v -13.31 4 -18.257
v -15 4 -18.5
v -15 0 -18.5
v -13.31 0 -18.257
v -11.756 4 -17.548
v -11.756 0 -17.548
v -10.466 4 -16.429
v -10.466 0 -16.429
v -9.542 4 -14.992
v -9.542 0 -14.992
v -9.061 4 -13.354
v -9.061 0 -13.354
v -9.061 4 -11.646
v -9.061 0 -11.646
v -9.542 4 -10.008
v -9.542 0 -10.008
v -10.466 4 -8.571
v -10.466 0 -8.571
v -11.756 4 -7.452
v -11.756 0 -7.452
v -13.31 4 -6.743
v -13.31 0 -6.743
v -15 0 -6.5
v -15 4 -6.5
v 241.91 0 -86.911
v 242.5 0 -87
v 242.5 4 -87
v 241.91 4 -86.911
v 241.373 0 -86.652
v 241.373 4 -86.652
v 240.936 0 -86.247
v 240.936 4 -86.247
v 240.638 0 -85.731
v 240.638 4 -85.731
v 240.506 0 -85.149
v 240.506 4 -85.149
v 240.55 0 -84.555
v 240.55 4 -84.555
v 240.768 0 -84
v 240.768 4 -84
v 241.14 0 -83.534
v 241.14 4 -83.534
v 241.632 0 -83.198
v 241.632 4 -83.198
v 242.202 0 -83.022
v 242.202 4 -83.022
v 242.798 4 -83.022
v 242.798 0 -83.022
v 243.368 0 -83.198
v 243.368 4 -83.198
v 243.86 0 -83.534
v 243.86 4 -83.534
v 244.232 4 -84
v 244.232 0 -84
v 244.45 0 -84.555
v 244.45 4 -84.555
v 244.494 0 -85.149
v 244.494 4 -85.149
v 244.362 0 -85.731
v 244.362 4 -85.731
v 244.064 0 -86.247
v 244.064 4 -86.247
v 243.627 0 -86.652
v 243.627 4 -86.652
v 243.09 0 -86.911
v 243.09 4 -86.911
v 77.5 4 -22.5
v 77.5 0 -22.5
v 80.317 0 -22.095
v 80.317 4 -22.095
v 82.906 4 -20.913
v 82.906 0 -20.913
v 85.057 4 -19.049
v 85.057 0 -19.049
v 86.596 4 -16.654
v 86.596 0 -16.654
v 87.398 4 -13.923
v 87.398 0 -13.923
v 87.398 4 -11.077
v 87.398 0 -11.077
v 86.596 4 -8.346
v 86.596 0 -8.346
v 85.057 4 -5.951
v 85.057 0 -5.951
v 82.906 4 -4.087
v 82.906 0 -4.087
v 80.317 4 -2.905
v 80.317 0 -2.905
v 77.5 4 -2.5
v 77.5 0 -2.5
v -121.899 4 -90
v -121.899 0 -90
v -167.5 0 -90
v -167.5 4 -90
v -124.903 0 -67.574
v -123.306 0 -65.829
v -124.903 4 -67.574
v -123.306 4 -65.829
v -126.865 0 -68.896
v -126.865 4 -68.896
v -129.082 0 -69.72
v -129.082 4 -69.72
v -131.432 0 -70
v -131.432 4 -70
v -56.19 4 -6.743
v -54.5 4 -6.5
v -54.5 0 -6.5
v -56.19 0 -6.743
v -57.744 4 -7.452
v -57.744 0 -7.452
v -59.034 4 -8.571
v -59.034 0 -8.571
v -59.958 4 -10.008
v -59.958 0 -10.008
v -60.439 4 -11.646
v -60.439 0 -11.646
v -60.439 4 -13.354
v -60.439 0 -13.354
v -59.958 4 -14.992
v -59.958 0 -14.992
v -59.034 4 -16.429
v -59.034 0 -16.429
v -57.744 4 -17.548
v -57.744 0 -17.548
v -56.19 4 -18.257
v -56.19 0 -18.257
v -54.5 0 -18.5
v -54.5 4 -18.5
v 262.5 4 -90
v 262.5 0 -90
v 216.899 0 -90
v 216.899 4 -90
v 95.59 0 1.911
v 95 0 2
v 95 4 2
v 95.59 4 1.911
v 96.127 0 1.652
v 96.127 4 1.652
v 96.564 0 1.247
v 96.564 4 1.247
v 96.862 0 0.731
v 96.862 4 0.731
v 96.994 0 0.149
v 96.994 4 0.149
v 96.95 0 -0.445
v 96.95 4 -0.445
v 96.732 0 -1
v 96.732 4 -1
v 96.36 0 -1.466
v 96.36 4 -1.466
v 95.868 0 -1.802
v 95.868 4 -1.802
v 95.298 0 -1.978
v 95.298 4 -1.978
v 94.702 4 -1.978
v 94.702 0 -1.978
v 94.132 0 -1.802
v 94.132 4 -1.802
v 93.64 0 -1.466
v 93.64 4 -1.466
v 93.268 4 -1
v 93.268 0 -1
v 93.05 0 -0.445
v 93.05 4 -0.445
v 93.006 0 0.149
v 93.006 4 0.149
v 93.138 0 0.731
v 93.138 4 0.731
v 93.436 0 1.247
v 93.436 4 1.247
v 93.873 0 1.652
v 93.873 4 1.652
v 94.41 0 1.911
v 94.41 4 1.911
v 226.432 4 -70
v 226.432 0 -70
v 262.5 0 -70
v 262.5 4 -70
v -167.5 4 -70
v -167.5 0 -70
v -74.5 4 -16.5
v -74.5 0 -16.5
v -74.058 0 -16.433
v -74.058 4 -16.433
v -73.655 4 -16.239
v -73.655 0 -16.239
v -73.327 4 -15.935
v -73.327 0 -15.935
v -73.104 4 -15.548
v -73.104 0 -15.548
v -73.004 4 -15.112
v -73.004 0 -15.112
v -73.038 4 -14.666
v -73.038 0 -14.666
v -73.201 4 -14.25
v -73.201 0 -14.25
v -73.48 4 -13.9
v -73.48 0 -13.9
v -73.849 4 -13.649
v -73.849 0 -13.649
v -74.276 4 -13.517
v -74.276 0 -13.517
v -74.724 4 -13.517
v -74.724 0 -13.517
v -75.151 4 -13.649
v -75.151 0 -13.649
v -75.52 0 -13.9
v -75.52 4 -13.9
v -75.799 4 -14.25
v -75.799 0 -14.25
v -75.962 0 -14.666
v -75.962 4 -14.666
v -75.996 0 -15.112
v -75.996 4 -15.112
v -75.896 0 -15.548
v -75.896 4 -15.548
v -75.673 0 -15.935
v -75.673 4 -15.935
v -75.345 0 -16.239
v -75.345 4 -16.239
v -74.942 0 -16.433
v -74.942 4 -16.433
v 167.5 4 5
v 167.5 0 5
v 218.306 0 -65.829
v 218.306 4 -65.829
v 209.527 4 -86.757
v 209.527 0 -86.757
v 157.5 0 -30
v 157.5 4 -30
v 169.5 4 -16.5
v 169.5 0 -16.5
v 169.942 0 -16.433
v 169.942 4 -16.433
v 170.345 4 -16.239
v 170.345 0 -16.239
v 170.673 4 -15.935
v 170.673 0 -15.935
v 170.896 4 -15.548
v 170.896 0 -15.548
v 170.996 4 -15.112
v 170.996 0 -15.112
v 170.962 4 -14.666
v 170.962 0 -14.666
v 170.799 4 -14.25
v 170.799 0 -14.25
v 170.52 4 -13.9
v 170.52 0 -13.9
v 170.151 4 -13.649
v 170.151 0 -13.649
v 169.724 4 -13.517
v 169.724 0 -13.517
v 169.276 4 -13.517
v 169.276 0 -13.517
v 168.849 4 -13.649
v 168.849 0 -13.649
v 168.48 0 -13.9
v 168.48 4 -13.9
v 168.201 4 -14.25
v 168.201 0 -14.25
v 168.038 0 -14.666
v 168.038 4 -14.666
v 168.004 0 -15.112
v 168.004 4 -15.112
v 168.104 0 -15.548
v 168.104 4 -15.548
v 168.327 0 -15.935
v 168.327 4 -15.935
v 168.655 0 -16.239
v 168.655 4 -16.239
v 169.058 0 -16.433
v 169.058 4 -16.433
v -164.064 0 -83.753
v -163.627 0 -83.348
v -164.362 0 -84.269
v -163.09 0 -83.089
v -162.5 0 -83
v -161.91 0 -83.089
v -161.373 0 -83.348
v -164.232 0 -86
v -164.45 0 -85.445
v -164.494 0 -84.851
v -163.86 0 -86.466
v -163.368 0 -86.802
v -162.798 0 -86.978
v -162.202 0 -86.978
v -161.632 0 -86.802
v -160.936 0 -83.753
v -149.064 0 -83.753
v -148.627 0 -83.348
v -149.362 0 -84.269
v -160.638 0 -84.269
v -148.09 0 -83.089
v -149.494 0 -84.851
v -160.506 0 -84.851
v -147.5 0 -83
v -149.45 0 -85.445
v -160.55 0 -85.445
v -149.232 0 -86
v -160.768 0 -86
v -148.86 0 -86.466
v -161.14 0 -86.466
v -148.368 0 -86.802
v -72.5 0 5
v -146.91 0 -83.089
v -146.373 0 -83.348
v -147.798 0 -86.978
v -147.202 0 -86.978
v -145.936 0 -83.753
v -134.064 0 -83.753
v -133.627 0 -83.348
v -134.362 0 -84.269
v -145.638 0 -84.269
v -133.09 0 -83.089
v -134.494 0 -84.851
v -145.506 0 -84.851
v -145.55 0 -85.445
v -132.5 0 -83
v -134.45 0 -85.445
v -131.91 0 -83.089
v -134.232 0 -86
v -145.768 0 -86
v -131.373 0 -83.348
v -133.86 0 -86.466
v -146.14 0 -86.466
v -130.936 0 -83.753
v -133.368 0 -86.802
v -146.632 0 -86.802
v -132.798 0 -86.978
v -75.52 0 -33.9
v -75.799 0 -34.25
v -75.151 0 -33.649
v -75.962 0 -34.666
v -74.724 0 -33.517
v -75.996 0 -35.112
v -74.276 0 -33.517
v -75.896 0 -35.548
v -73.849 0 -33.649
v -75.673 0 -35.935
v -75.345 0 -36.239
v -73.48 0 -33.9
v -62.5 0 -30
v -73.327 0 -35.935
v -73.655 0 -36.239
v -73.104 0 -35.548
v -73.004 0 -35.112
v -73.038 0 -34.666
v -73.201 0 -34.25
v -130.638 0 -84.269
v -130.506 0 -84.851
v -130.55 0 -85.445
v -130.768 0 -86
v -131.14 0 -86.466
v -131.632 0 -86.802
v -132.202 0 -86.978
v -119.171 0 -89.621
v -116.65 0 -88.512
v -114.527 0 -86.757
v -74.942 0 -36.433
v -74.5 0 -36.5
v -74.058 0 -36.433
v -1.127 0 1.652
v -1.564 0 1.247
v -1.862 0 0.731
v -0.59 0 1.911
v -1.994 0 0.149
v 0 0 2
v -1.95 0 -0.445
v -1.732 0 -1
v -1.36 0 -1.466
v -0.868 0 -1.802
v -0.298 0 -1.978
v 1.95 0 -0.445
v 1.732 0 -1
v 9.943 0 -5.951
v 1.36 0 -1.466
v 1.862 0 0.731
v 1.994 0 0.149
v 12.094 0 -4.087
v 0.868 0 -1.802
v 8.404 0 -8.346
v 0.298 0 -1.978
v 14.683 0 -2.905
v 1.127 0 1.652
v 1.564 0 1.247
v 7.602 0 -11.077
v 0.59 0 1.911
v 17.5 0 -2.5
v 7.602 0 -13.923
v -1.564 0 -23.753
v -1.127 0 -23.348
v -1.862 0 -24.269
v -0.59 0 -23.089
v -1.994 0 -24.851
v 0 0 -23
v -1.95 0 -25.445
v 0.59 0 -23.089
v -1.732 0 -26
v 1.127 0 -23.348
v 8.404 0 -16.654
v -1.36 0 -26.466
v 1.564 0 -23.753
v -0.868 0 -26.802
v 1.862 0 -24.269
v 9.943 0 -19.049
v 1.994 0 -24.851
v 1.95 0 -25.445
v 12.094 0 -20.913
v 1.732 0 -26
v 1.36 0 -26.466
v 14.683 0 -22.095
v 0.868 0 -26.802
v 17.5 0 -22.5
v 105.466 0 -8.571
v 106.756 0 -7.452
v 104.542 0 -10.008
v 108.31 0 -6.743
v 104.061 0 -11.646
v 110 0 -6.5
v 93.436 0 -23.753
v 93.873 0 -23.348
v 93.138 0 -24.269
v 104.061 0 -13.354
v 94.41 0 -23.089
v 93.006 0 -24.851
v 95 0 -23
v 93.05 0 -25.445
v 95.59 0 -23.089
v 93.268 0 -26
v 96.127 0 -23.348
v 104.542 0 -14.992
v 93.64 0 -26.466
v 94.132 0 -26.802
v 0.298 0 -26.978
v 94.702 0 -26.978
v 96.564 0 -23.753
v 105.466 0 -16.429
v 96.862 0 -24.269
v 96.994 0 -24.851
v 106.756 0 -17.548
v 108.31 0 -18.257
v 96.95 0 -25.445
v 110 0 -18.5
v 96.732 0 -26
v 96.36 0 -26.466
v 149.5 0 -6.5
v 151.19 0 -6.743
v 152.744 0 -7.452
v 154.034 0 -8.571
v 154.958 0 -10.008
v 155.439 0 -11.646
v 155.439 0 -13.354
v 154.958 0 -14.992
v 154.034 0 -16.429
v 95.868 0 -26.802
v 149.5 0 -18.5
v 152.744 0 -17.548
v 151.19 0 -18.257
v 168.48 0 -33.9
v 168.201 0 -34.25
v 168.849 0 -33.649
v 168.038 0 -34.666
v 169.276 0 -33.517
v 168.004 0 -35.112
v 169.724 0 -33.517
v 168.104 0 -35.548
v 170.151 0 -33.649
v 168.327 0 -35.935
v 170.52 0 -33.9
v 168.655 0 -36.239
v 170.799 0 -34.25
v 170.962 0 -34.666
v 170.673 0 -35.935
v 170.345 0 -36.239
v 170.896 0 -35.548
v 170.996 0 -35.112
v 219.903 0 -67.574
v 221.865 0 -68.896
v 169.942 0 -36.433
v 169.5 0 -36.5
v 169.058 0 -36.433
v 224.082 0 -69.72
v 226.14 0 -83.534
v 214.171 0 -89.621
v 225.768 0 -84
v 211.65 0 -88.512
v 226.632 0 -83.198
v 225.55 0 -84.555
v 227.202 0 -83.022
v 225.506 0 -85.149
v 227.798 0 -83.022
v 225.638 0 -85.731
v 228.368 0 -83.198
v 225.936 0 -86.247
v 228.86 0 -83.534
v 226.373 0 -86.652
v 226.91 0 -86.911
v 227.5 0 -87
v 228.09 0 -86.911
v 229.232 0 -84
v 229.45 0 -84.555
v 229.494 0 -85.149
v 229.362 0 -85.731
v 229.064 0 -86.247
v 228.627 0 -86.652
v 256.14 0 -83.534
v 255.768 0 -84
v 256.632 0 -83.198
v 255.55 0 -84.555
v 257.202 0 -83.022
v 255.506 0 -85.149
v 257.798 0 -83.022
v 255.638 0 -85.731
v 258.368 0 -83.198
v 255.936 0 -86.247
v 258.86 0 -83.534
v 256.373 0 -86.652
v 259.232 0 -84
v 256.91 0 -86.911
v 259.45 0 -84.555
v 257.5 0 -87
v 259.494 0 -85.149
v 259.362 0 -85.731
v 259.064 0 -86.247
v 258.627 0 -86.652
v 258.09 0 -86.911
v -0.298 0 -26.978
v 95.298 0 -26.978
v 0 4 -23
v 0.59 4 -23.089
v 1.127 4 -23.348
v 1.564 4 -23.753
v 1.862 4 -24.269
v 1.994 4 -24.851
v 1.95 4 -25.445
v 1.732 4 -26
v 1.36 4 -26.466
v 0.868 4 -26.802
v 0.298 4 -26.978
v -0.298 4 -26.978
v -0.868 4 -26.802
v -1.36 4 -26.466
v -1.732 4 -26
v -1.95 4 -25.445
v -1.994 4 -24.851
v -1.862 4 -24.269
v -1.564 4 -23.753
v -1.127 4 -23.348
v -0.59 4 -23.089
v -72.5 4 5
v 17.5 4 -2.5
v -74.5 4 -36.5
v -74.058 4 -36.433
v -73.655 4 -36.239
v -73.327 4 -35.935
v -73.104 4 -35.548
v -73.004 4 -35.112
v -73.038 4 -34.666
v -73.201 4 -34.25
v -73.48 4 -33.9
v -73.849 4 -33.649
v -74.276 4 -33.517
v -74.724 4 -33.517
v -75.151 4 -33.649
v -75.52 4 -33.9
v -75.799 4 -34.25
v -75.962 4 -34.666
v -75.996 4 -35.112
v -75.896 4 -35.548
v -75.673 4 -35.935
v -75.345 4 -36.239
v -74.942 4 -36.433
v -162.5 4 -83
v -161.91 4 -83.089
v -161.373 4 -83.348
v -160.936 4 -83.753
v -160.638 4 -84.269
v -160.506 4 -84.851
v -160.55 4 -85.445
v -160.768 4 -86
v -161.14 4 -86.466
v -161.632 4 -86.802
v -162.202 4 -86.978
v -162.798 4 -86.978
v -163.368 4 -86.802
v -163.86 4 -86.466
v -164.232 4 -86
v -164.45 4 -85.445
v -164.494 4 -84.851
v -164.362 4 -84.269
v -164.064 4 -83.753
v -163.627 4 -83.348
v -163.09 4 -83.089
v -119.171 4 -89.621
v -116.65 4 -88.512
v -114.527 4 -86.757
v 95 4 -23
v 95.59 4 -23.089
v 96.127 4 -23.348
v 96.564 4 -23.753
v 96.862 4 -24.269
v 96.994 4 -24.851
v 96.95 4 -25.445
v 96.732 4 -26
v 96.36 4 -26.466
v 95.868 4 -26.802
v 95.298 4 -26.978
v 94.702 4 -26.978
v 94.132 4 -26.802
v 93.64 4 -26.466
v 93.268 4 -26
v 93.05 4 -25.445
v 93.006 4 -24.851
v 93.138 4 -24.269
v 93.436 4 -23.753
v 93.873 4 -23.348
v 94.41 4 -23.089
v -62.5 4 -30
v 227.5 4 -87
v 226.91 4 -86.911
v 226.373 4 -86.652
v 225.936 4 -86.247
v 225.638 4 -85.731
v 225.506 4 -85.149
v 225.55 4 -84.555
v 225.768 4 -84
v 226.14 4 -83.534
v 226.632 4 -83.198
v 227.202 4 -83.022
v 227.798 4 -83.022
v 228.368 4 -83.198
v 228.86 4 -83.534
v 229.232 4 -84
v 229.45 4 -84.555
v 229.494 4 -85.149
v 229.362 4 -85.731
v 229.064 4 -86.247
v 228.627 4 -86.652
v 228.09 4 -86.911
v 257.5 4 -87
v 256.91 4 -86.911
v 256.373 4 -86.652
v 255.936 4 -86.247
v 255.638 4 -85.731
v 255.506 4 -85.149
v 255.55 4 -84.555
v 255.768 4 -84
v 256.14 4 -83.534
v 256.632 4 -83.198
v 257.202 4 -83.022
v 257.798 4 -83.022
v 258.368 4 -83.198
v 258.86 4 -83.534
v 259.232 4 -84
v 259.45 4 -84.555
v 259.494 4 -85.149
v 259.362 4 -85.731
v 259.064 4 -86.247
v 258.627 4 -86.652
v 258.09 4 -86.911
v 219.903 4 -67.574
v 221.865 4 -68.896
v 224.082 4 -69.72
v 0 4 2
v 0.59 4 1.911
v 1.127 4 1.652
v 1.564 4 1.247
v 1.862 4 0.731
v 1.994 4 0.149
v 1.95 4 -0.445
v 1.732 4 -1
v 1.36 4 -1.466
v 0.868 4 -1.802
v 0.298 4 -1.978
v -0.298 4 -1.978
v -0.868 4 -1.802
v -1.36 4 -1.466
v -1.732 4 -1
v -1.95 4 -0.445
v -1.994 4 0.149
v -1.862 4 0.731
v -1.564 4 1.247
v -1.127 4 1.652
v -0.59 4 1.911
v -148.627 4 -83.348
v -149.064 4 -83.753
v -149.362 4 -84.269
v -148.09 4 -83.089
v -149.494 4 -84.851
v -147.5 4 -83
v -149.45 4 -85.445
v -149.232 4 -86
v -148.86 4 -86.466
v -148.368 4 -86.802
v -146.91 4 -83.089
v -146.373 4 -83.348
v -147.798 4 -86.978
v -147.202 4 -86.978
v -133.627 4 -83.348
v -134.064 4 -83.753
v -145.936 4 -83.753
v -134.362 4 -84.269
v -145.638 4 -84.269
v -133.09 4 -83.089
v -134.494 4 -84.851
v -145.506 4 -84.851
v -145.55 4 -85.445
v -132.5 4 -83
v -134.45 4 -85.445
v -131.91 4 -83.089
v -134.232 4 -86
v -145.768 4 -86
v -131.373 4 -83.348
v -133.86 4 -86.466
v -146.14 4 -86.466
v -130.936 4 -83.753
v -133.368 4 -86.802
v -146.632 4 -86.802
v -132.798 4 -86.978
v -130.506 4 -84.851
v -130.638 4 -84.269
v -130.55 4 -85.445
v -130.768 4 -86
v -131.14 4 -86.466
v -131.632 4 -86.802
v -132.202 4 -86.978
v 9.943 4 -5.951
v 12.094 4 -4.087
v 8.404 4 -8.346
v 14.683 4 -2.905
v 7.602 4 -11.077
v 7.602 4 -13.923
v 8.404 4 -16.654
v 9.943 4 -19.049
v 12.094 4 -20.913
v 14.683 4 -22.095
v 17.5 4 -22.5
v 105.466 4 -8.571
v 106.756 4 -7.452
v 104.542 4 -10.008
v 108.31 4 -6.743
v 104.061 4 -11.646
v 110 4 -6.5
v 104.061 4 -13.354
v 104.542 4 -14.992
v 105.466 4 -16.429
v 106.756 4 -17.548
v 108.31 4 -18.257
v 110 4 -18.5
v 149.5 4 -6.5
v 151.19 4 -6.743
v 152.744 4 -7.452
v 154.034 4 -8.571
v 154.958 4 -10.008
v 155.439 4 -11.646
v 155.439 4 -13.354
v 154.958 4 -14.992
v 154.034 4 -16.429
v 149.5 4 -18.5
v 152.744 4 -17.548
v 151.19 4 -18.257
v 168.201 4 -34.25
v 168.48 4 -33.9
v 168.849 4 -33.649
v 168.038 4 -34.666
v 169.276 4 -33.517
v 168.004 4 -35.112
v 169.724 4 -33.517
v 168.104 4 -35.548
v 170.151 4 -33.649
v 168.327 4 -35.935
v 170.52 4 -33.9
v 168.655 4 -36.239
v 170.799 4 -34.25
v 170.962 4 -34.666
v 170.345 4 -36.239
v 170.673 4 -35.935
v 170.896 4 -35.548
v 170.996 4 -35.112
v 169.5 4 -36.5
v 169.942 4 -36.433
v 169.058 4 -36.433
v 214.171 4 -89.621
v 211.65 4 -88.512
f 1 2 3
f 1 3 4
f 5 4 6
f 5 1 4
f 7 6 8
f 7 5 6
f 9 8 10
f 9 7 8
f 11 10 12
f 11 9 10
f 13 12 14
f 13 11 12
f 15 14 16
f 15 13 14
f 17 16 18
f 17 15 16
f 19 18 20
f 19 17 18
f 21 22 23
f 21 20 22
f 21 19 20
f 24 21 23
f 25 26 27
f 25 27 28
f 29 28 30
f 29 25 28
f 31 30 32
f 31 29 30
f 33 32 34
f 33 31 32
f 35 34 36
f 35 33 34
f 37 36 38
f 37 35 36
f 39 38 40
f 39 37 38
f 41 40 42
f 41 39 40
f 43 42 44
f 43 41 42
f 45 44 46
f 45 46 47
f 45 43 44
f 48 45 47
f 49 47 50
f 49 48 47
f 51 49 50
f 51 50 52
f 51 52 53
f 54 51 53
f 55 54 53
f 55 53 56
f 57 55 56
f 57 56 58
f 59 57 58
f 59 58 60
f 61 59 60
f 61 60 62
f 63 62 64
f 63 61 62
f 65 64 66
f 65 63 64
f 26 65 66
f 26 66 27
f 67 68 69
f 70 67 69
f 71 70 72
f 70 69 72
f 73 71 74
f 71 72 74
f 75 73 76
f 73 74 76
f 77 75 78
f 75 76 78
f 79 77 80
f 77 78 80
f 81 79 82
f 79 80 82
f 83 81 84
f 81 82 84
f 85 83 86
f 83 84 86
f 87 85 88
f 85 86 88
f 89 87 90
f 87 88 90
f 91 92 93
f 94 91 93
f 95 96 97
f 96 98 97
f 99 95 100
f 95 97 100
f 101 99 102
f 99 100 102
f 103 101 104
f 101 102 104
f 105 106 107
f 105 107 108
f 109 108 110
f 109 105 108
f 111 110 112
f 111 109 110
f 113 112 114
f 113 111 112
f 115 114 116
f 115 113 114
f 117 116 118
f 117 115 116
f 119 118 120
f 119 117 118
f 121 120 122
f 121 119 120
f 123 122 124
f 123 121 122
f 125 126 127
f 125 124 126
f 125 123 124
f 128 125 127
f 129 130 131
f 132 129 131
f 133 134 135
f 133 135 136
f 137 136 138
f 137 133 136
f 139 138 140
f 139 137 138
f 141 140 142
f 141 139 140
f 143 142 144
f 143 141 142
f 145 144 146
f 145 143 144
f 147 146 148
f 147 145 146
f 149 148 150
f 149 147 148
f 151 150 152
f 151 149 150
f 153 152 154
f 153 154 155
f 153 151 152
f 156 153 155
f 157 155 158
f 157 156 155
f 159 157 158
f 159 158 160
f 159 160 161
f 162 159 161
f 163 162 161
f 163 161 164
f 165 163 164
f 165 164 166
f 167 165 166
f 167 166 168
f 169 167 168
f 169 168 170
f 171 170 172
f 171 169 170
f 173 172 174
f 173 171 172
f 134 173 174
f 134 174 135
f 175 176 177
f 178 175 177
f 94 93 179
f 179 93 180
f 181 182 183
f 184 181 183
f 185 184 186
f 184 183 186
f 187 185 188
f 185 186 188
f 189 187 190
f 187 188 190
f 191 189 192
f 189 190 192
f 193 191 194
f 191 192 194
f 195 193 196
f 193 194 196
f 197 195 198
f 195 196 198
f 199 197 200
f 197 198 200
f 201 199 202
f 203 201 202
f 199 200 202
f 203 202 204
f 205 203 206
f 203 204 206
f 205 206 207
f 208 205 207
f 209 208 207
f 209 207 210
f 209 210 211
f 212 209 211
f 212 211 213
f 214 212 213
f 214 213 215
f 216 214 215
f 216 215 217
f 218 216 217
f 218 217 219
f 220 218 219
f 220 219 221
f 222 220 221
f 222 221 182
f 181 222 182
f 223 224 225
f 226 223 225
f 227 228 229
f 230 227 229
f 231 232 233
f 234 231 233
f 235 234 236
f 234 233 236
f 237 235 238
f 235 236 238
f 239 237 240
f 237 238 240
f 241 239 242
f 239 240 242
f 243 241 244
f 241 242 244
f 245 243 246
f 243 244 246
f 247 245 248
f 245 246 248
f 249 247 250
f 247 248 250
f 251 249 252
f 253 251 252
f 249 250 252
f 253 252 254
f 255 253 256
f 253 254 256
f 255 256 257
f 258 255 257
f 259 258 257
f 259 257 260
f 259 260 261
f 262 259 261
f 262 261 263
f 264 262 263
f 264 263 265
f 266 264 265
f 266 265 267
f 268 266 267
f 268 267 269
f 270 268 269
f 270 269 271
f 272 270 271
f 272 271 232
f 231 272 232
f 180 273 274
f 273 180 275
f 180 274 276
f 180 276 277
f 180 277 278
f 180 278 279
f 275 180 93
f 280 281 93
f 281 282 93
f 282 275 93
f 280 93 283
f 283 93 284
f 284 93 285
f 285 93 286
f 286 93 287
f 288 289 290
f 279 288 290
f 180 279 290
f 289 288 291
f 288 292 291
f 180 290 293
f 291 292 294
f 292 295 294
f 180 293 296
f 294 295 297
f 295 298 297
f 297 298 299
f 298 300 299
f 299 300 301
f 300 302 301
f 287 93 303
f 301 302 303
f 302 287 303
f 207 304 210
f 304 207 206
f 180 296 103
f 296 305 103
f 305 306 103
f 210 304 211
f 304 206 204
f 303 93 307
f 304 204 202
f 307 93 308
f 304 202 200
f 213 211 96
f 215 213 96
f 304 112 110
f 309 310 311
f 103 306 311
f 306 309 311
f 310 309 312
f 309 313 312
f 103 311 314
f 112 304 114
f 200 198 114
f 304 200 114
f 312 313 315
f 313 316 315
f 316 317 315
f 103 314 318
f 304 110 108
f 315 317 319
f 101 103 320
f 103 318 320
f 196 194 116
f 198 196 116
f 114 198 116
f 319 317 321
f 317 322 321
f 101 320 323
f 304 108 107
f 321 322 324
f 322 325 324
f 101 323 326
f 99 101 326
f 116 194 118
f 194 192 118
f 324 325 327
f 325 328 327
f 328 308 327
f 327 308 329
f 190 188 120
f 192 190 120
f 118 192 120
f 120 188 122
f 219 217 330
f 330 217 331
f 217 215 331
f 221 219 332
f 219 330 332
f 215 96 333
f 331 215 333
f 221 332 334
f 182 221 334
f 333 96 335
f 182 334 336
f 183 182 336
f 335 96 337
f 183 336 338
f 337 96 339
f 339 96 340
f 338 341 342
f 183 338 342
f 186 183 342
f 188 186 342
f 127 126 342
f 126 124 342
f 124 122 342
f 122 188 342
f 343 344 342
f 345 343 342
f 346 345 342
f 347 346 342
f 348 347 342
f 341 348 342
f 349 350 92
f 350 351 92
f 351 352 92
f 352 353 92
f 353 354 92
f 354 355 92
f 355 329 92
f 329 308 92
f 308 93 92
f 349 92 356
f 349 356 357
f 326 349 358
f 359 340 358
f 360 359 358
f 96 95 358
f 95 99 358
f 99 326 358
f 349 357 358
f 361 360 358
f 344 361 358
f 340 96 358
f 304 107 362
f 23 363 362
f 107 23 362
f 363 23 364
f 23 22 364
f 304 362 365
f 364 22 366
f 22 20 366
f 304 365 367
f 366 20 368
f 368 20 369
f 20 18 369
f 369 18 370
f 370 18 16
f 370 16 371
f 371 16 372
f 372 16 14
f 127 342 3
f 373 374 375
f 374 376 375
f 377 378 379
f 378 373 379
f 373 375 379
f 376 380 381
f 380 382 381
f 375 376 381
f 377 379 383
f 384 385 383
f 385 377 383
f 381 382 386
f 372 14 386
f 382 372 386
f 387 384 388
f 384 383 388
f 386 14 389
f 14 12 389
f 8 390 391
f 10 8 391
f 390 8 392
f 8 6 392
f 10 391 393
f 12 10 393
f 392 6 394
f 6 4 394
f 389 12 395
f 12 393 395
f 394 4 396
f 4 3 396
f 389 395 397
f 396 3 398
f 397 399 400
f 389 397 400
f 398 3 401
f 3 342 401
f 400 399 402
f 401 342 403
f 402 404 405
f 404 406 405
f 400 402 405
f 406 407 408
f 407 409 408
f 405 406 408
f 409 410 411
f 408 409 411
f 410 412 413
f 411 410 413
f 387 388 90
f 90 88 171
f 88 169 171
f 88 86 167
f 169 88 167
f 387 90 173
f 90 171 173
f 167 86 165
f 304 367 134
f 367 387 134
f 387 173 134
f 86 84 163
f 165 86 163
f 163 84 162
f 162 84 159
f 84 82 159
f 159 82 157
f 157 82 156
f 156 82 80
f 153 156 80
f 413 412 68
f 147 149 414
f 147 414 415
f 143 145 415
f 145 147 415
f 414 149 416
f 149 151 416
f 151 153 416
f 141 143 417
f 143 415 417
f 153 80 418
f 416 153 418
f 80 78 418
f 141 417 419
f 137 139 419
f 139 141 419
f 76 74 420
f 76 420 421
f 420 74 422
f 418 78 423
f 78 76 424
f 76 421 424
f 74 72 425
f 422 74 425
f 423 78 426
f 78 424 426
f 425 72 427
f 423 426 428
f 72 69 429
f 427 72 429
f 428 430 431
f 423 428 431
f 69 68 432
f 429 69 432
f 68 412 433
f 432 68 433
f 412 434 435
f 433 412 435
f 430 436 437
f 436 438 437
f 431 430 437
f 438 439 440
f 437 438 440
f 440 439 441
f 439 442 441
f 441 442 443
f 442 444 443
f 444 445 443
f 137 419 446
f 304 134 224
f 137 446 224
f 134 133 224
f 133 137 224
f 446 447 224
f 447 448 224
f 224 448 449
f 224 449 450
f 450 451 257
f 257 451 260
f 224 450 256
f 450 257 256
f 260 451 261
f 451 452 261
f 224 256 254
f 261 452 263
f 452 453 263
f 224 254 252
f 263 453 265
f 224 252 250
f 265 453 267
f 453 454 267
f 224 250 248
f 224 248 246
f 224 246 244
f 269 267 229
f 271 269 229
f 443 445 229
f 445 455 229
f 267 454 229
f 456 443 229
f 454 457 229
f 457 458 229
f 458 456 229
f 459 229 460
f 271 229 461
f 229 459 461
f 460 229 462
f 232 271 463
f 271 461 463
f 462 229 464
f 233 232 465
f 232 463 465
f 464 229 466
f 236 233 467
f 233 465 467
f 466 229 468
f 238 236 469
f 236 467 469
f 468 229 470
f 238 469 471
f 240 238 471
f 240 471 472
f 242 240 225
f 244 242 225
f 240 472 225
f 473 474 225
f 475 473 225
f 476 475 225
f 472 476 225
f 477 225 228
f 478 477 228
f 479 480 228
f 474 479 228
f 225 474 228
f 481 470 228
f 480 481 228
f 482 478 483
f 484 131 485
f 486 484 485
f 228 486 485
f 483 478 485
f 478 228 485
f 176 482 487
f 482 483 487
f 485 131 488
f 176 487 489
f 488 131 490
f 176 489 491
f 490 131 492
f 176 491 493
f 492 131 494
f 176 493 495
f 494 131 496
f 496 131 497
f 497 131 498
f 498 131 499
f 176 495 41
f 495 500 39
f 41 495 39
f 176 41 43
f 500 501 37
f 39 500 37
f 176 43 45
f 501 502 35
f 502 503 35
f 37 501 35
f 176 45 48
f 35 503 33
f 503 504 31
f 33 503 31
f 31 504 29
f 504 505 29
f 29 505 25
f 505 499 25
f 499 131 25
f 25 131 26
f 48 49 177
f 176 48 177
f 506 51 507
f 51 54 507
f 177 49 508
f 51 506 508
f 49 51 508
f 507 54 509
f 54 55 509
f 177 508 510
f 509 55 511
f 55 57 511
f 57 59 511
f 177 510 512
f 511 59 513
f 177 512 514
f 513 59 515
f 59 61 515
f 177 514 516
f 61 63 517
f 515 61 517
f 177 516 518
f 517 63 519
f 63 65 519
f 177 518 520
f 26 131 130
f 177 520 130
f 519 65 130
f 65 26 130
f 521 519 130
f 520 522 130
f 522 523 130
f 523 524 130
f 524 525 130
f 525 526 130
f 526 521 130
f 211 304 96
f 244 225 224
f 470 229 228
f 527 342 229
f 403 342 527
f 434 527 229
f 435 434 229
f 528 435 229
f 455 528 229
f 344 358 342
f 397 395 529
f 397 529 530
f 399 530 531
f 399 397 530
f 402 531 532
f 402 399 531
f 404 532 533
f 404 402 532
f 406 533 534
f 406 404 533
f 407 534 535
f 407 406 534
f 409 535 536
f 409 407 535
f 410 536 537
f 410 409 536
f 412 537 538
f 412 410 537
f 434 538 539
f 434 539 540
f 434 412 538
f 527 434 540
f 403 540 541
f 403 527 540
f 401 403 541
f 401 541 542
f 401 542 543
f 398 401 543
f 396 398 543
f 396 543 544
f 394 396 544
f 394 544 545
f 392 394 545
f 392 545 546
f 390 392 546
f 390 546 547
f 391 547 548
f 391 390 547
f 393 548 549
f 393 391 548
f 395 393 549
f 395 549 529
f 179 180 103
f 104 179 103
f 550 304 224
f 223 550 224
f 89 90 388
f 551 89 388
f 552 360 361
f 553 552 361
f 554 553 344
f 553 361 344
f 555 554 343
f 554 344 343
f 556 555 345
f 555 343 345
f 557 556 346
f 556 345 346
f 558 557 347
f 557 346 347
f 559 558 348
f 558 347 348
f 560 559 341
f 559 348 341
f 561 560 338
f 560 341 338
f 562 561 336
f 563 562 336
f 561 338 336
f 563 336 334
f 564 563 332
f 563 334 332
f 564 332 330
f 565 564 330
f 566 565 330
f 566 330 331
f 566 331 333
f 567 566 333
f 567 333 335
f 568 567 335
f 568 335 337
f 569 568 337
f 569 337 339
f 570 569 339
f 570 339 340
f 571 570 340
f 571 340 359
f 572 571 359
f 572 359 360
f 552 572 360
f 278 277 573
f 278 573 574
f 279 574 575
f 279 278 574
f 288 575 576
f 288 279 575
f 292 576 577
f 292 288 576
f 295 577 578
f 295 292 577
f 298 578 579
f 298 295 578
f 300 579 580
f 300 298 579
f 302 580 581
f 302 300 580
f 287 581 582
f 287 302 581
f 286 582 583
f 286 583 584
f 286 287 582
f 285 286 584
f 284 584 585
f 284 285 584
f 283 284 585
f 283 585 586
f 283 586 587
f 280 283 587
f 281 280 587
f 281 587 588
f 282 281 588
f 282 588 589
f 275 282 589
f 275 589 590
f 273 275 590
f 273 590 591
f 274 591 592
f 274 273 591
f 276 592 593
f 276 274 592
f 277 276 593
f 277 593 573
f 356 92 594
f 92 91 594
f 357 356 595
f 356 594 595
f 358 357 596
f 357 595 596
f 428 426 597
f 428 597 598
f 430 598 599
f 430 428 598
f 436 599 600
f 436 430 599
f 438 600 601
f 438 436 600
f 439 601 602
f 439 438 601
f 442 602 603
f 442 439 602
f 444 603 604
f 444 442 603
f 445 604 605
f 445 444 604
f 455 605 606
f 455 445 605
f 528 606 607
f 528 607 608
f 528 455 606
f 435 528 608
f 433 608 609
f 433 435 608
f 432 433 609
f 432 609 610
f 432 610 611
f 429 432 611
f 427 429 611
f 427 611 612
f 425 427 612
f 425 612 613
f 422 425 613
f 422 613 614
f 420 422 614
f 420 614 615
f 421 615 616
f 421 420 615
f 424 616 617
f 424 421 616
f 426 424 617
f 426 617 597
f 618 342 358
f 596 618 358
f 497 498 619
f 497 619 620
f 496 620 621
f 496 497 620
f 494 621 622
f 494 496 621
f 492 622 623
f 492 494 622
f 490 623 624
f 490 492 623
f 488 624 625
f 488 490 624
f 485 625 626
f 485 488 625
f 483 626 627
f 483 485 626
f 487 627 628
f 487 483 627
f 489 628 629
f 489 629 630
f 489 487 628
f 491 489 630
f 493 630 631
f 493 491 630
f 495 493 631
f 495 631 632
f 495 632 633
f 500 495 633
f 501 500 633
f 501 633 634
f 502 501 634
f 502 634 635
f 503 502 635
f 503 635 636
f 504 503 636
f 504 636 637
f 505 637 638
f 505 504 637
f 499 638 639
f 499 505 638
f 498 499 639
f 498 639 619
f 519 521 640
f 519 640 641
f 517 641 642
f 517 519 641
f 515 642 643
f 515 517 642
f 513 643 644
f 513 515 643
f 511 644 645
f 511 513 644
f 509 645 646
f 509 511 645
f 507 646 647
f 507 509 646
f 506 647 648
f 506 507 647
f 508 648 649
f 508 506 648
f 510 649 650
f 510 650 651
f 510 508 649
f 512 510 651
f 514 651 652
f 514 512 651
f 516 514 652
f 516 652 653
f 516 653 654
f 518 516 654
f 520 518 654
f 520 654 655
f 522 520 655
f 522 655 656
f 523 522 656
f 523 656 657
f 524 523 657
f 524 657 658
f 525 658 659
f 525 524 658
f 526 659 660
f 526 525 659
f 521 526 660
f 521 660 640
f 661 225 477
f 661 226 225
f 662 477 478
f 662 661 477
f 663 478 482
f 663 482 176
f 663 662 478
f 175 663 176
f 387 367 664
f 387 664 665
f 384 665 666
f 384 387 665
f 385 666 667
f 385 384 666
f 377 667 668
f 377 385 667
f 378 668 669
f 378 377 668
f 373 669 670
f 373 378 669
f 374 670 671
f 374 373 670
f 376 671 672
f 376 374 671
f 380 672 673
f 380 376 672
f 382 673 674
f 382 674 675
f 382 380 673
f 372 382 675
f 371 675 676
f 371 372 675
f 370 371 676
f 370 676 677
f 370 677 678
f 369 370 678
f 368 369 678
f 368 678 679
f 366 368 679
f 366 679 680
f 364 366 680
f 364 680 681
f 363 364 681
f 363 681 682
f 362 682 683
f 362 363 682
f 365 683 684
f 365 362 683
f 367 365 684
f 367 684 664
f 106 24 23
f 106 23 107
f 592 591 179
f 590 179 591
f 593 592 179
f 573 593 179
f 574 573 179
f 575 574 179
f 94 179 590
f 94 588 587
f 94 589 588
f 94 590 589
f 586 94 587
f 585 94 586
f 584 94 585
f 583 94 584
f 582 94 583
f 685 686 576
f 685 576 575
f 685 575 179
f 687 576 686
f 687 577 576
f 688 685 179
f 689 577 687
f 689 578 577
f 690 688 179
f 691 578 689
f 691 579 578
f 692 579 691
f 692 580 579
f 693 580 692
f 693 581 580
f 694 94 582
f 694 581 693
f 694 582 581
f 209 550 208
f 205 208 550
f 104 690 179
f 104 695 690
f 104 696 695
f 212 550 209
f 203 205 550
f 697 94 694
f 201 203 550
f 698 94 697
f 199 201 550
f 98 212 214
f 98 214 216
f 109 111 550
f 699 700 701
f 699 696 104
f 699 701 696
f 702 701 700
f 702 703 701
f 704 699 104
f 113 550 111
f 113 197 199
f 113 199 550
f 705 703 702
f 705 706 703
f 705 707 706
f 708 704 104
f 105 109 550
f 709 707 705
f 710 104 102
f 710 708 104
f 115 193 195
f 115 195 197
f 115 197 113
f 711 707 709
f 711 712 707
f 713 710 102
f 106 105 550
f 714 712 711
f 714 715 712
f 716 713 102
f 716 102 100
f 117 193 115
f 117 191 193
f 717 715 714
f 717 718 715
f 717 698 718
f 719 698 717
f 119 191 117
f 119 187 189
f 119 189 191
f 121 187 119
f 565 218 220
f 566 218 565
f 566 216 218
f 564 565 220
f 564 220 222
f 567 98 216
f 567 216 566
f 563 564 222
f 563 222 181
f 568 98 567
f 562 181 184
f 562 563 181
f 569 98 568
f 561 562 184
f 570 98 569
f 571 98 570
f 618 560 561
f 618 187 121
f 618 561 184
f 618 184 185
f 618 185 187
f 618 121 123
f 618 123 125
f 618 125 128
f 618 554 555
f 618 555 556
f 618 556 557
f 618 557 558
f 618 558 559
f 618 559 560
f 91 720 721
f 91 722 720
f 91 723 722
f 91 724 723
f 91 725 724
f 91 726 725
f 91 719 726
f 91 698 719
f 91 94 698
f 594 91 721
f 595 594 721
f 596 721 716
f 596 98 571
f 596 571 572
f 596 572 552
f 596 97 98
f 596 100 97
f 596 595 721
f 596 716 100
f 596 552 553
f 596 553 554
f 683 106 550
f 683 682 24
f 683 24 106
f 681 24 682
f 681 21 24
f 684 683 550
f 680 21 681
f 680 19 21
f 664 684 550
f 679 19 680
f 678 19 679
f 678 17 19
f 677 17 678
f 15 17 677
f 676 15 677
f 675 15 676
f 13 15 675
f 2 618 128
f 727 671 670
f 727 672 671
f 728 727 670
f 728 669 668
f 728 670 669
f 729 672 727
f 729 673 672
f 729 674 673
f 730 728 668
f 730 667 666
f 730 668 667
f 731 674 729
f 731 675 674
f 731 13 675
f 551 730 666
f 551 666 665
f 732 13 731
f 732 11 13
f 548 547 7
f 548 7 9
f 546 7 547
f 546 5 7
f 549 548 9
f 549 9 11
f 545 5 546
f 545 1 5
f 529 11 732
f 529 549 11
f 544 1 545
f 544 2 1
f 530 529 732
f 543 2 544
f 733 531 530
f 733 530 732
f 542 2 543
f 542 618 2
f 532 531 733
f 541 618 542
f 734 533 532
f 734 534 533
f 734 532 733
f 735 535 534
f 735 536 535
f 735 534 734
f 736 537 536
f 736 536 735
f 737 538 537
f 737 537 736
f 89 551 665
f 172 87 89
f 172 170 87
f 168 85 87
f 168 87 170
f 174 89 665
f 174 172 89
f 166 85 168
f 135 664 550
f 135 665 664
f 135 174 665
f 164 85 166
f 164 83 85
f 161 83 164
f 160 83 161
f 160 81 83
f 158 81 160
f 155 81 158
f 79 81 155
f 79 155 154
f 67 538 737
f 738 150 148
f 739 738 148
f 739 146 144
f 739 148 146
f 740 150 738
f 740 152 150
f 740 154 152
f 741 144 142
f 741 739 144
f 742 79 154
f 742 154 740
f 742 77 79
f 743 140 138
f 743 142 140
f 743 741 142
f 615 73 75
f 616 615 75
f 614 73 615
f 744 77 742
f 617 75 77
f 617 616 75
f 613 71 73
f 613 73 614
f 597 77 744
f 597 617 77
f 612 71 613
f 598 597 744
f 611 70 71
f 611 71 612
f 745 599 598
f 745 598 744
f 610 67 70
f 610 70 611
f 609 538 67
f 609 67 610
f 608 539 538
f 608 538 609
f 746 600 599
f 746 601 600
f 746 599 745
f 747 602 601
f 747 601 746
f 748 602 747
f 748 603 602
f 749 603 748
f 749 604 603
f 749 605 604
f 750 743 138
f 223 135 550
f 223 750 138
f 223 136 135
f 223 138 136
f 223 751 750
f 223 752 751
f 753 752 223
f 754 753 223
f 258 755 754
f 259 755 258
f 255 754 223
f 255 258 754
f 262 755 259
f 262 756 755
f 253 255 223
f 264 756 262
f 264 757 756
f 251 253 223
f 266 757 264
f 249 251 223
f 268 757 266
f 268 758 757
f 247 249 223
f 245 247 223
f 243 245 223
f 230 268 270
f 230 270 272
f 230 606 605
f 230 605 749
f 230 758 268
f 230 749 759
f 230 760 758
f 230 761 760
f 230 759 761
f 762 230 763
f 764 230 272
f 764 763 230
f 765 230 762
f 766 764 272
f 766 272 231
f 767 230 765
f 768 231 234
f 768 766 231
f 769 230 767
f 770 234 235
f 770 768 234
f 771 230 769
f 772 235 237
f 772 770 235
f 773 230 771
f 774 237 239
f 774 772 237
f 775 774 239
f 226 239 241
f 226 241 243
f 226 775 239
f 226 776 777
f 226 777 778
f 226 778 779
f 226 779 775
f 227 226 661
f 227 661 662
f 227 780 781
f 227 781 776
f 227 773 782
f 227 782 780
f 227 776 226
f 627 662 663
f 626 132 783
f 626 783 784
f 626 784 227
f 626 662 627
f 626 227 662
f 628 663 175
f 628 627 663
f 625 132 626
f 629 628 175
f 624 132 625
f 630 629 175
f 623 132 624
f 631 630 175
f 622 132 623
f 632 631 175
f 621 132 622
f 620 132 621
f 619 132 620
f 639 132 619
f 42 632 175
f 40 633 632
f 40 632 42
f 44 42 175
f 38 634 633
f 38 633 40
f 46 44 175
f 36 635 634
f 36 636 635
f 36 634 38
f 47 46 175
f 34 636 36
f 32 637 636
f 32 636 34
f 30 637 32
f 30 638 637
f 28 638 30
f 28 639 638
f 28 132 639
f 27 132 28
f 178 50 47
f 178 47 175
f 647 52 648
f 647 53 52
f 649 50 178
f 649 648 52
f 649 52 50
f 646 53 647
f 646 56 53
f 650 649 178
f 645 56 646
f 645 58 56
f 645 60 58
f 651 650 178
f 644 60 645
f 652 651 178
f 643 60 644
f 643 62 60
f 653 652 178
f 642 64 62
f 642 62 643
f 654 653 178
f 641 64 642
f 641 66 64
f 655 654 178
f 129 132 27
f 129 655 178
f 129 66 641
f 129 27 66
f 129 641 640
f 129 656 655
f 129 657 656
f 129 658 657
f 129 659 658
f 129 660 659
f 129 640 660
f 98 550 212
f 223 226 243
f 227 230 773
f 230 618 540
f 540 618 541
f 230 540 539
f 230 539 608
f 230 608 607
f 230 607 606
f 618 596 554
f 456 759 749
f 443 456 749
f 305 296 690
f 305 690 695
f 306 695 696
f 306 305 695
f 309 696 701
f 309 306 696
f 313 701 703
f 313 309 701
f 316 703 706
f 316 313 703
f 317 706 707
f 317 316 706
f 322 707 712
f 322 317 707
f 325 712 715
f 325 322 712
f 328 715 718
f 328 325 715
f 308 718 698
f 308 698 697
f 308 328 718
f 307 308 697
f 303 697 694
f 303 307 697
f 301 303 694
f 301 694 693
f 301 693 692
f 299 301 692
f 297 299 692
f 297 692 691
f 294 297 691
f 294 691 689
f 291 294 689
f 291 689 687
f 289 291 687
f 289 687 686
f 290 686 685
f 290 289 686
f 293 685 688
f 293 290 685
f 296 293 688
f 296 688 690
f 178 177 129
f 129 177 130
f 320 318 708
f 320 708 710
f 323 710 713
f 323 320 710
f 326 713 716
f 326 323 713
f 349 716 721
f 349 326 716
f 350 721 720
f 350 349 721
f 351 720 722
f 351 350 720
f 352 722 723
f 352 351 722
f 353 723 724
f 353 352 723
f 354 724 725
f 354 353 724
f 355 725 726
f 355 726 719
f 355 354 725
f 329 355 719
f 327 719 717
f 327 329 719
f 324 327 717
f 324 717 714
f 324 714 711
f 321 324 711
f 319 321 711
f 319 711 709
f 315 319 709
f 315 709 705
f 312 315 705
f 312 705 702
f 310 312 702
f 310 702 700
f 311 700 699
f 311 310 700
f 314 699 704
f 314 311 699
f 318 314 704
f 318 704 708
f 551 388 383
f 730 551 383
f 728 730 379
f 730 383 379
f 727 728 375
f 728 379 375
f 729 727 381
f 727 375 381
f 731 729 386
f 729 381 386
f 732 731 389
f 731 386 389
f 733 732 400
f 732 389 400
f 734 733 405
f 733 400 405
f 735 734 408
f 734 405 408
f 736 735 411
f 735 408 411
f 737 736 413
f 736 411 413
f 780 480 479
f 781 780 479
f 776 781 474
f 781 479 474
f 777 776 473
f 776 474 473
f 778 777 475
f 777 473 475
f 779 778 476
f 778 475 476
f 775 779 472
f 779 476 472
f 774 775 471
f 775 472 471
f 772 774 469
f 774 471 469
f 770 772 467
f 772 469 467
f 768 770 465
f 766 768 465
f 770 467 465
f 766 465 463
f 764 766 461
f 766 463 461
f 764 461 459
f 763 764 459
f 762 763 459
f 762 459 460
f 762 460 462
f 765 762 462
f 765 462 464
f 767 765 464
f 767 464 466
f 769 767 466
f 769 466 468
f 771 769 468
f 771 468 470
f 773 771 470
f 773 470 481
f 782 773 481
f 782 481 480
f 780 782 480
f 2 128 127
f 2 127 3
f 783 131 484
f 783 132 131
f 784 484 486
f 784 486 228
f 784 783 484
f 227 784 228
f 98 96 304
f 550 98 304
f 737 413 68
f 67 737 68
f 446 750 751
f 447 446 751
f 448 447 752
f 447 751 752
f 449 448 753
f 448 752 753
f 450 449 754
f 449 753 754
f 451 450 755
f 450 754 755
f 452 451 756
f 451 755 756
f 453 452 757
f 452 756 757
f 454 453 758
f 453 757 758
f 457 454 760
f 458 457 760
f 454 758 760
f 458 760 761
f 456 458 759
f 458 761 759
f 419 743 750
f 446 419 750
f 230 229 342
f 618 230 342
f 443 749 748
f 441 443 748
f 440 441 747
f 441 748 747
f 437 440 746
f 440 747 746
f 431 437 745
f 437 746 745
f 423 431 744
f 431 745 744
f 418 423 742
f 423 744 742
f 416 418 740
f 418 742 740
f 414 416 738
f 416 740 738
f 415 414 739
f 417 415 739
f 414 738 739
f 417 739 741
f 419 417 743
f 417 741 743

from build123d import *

# Parameters (mm, degrees)
SKETCH_2_R          = 2
EXTRUDE_1_DEPTH     = 4
SKETCH_3_R          = 1.5
CUT_EXTRUDE_1_DEPTH = 10
FILLET_1_R          = 10
CUT_EXTRUDE_2_DEPTH = 278.528827332


with BuildPart() as part:
    # 草图2 → 凸台-拉伸1 (new body)
    with BuildSketch(Plane(origin=(0, 0, 0), x_dir=(1, 0, 0), z_dir=(0, 1, 0))):
        Polygon((-72.5, -5), (167.5, -5), (221.298034327, 70), (262.5, 70), (262.5, 90), (212.5, 90), (157.5, 30), (-62.5, 30), (-117.5, 90), (-167.5, 90), (-167.5, 70), (-126.298034327, 70), align=None)
        with Locations(Location((0, 0, 0), (0, 0, 270))):
            Circle(SKETCH_2_R, mode=Mode.SUBTRACT)
        with Locations(Location((95, 0, 0), (0, 0, 270))):
            Circle(SKETCH_2_R, mode=Mode.SUBTRACT)
        with Locations(Location((95, 25, 0), (0, 0, 270))):
            Circle(SKETCH_2_R, mode=Mode.SUBTRACT)
        with Locations(Location((0, 25, 0), (0, 0, 270))):
            Circle(SKETCH_2_R, mode=Mode.SUBTRACT)
        with Locations(Location((-162.5, 85, 0), (0, 0, 270))):
            Circle(SKETCH_2_R, mode=Mode.SUBTRACT)
        with Locations(Location((-147.5, 85, 0), (0, 0, 270))):
            Circle(SKETCH_2_R, mode=Mode.SUBTRACT)
        with Locations(Location((-132.5, 85, 0), (0, 0, 270))):
            Circle(SKETCH_2_R, mode=Mode.SUBTRACT)
        with Locations(Location((227.5, 85, 0), (0, 0, 90))):
            Circle(SKETCH_2_R, mode=Mode.SUBTRACT)
        with Locations(Location((242.5, 85, 0), (0, 0, 90))):
            Circle(SKETCH_2_R, mode=Mode.SUBTRACT)
        with Locations(Location((257.5, 85, 0), (0, 0, 90))):
            Circle(SKETCH_2_R, mode=Mode.SUBTRACT)
        with BuildLine():
            Line((77.5, 2.5), (17.5, 2.5))
            ThreePointArc((17.5, 2.5), (7.5, 12.5), (17.5, 22.5))
            Line((17.5, 22.5), (77.5, 22.5))
            ThreePointArc((77.5, 22.5), (87.5, 12.5), (77.5, 2.5))
        make_face(mode=Mode.SUBTRACT)
    extrude(amount=EXTRUDE_1_DEPTH)

    # 草图3 → 切除-拉伸1 (cut)
    with BuildSketch(Plane.XZ):
        with Locations(Location((169.5, -35, 0), (0, 0, 270))):
            Circle(SKETCH_3_R)
        with Locations(Location((169.5, -15, 0), (0, 0, 270))):
            Circle(SKETCH_3_R)
        with Locations(Location((-74.5, -15, 0), (0, 0, 270))):
            Circle(SKETCH_3_R)
        with Locations(Location((-74.5, -35, 0), (0, 0, 270))):
            Circle(SKETCH_3_R)
    extrude(amount=-CUT_EXTRUDE_1_DEPTH, mode=Mode.SUBTRACT)

    # 圆角1
    fillet_1_edges = [part.edges().sort_by_distance(p)[0] for p in [
        (212.5, 2, -90),
        (221.298034327, 2, -70),
        (-126.298034327, 2, -70),
        (-117.5, 2, -90),
    ]]
    fillet(fillet_1_edges, radius=FILLET_1_R)

    # 草图4 → 切除-拉伸2 (cut, through all)
    with BuildSketch(Plane(origin=(0, 4, 0), x_dir=(1, 0, 0), z_dir=(0, 1, 0))):
        with BuildLine():
            Line((-54.5, 18.5), (-15, 18.5))
            ThreePointArc((-15, 18.5), (-9, 12.5), (-15, 6.5))
            Line((-15, 6.5), (-54.5, 6.5))
            ThreePointArc((-54.5, 6.5), (-60.5, 12.5), (-54.5, 18.5))
        make_face()
        with BuildLine():
            Line((149.5, 18.5), (110, 18.5))
            ThreePointArc((110, 18.5), (104, 12.5), (110, 6.5))
            Line((110, 6.5), (149.5, 6.5))
            ThreePointArc((149.5, 6.5), (155.5, 12.5), (149.5, 18.5))
        make_face()
    extrude(amount=-CUT_EXTRUDE_2_DEPTH, mode=Mode.SUBTRACT)


solid = part.part
